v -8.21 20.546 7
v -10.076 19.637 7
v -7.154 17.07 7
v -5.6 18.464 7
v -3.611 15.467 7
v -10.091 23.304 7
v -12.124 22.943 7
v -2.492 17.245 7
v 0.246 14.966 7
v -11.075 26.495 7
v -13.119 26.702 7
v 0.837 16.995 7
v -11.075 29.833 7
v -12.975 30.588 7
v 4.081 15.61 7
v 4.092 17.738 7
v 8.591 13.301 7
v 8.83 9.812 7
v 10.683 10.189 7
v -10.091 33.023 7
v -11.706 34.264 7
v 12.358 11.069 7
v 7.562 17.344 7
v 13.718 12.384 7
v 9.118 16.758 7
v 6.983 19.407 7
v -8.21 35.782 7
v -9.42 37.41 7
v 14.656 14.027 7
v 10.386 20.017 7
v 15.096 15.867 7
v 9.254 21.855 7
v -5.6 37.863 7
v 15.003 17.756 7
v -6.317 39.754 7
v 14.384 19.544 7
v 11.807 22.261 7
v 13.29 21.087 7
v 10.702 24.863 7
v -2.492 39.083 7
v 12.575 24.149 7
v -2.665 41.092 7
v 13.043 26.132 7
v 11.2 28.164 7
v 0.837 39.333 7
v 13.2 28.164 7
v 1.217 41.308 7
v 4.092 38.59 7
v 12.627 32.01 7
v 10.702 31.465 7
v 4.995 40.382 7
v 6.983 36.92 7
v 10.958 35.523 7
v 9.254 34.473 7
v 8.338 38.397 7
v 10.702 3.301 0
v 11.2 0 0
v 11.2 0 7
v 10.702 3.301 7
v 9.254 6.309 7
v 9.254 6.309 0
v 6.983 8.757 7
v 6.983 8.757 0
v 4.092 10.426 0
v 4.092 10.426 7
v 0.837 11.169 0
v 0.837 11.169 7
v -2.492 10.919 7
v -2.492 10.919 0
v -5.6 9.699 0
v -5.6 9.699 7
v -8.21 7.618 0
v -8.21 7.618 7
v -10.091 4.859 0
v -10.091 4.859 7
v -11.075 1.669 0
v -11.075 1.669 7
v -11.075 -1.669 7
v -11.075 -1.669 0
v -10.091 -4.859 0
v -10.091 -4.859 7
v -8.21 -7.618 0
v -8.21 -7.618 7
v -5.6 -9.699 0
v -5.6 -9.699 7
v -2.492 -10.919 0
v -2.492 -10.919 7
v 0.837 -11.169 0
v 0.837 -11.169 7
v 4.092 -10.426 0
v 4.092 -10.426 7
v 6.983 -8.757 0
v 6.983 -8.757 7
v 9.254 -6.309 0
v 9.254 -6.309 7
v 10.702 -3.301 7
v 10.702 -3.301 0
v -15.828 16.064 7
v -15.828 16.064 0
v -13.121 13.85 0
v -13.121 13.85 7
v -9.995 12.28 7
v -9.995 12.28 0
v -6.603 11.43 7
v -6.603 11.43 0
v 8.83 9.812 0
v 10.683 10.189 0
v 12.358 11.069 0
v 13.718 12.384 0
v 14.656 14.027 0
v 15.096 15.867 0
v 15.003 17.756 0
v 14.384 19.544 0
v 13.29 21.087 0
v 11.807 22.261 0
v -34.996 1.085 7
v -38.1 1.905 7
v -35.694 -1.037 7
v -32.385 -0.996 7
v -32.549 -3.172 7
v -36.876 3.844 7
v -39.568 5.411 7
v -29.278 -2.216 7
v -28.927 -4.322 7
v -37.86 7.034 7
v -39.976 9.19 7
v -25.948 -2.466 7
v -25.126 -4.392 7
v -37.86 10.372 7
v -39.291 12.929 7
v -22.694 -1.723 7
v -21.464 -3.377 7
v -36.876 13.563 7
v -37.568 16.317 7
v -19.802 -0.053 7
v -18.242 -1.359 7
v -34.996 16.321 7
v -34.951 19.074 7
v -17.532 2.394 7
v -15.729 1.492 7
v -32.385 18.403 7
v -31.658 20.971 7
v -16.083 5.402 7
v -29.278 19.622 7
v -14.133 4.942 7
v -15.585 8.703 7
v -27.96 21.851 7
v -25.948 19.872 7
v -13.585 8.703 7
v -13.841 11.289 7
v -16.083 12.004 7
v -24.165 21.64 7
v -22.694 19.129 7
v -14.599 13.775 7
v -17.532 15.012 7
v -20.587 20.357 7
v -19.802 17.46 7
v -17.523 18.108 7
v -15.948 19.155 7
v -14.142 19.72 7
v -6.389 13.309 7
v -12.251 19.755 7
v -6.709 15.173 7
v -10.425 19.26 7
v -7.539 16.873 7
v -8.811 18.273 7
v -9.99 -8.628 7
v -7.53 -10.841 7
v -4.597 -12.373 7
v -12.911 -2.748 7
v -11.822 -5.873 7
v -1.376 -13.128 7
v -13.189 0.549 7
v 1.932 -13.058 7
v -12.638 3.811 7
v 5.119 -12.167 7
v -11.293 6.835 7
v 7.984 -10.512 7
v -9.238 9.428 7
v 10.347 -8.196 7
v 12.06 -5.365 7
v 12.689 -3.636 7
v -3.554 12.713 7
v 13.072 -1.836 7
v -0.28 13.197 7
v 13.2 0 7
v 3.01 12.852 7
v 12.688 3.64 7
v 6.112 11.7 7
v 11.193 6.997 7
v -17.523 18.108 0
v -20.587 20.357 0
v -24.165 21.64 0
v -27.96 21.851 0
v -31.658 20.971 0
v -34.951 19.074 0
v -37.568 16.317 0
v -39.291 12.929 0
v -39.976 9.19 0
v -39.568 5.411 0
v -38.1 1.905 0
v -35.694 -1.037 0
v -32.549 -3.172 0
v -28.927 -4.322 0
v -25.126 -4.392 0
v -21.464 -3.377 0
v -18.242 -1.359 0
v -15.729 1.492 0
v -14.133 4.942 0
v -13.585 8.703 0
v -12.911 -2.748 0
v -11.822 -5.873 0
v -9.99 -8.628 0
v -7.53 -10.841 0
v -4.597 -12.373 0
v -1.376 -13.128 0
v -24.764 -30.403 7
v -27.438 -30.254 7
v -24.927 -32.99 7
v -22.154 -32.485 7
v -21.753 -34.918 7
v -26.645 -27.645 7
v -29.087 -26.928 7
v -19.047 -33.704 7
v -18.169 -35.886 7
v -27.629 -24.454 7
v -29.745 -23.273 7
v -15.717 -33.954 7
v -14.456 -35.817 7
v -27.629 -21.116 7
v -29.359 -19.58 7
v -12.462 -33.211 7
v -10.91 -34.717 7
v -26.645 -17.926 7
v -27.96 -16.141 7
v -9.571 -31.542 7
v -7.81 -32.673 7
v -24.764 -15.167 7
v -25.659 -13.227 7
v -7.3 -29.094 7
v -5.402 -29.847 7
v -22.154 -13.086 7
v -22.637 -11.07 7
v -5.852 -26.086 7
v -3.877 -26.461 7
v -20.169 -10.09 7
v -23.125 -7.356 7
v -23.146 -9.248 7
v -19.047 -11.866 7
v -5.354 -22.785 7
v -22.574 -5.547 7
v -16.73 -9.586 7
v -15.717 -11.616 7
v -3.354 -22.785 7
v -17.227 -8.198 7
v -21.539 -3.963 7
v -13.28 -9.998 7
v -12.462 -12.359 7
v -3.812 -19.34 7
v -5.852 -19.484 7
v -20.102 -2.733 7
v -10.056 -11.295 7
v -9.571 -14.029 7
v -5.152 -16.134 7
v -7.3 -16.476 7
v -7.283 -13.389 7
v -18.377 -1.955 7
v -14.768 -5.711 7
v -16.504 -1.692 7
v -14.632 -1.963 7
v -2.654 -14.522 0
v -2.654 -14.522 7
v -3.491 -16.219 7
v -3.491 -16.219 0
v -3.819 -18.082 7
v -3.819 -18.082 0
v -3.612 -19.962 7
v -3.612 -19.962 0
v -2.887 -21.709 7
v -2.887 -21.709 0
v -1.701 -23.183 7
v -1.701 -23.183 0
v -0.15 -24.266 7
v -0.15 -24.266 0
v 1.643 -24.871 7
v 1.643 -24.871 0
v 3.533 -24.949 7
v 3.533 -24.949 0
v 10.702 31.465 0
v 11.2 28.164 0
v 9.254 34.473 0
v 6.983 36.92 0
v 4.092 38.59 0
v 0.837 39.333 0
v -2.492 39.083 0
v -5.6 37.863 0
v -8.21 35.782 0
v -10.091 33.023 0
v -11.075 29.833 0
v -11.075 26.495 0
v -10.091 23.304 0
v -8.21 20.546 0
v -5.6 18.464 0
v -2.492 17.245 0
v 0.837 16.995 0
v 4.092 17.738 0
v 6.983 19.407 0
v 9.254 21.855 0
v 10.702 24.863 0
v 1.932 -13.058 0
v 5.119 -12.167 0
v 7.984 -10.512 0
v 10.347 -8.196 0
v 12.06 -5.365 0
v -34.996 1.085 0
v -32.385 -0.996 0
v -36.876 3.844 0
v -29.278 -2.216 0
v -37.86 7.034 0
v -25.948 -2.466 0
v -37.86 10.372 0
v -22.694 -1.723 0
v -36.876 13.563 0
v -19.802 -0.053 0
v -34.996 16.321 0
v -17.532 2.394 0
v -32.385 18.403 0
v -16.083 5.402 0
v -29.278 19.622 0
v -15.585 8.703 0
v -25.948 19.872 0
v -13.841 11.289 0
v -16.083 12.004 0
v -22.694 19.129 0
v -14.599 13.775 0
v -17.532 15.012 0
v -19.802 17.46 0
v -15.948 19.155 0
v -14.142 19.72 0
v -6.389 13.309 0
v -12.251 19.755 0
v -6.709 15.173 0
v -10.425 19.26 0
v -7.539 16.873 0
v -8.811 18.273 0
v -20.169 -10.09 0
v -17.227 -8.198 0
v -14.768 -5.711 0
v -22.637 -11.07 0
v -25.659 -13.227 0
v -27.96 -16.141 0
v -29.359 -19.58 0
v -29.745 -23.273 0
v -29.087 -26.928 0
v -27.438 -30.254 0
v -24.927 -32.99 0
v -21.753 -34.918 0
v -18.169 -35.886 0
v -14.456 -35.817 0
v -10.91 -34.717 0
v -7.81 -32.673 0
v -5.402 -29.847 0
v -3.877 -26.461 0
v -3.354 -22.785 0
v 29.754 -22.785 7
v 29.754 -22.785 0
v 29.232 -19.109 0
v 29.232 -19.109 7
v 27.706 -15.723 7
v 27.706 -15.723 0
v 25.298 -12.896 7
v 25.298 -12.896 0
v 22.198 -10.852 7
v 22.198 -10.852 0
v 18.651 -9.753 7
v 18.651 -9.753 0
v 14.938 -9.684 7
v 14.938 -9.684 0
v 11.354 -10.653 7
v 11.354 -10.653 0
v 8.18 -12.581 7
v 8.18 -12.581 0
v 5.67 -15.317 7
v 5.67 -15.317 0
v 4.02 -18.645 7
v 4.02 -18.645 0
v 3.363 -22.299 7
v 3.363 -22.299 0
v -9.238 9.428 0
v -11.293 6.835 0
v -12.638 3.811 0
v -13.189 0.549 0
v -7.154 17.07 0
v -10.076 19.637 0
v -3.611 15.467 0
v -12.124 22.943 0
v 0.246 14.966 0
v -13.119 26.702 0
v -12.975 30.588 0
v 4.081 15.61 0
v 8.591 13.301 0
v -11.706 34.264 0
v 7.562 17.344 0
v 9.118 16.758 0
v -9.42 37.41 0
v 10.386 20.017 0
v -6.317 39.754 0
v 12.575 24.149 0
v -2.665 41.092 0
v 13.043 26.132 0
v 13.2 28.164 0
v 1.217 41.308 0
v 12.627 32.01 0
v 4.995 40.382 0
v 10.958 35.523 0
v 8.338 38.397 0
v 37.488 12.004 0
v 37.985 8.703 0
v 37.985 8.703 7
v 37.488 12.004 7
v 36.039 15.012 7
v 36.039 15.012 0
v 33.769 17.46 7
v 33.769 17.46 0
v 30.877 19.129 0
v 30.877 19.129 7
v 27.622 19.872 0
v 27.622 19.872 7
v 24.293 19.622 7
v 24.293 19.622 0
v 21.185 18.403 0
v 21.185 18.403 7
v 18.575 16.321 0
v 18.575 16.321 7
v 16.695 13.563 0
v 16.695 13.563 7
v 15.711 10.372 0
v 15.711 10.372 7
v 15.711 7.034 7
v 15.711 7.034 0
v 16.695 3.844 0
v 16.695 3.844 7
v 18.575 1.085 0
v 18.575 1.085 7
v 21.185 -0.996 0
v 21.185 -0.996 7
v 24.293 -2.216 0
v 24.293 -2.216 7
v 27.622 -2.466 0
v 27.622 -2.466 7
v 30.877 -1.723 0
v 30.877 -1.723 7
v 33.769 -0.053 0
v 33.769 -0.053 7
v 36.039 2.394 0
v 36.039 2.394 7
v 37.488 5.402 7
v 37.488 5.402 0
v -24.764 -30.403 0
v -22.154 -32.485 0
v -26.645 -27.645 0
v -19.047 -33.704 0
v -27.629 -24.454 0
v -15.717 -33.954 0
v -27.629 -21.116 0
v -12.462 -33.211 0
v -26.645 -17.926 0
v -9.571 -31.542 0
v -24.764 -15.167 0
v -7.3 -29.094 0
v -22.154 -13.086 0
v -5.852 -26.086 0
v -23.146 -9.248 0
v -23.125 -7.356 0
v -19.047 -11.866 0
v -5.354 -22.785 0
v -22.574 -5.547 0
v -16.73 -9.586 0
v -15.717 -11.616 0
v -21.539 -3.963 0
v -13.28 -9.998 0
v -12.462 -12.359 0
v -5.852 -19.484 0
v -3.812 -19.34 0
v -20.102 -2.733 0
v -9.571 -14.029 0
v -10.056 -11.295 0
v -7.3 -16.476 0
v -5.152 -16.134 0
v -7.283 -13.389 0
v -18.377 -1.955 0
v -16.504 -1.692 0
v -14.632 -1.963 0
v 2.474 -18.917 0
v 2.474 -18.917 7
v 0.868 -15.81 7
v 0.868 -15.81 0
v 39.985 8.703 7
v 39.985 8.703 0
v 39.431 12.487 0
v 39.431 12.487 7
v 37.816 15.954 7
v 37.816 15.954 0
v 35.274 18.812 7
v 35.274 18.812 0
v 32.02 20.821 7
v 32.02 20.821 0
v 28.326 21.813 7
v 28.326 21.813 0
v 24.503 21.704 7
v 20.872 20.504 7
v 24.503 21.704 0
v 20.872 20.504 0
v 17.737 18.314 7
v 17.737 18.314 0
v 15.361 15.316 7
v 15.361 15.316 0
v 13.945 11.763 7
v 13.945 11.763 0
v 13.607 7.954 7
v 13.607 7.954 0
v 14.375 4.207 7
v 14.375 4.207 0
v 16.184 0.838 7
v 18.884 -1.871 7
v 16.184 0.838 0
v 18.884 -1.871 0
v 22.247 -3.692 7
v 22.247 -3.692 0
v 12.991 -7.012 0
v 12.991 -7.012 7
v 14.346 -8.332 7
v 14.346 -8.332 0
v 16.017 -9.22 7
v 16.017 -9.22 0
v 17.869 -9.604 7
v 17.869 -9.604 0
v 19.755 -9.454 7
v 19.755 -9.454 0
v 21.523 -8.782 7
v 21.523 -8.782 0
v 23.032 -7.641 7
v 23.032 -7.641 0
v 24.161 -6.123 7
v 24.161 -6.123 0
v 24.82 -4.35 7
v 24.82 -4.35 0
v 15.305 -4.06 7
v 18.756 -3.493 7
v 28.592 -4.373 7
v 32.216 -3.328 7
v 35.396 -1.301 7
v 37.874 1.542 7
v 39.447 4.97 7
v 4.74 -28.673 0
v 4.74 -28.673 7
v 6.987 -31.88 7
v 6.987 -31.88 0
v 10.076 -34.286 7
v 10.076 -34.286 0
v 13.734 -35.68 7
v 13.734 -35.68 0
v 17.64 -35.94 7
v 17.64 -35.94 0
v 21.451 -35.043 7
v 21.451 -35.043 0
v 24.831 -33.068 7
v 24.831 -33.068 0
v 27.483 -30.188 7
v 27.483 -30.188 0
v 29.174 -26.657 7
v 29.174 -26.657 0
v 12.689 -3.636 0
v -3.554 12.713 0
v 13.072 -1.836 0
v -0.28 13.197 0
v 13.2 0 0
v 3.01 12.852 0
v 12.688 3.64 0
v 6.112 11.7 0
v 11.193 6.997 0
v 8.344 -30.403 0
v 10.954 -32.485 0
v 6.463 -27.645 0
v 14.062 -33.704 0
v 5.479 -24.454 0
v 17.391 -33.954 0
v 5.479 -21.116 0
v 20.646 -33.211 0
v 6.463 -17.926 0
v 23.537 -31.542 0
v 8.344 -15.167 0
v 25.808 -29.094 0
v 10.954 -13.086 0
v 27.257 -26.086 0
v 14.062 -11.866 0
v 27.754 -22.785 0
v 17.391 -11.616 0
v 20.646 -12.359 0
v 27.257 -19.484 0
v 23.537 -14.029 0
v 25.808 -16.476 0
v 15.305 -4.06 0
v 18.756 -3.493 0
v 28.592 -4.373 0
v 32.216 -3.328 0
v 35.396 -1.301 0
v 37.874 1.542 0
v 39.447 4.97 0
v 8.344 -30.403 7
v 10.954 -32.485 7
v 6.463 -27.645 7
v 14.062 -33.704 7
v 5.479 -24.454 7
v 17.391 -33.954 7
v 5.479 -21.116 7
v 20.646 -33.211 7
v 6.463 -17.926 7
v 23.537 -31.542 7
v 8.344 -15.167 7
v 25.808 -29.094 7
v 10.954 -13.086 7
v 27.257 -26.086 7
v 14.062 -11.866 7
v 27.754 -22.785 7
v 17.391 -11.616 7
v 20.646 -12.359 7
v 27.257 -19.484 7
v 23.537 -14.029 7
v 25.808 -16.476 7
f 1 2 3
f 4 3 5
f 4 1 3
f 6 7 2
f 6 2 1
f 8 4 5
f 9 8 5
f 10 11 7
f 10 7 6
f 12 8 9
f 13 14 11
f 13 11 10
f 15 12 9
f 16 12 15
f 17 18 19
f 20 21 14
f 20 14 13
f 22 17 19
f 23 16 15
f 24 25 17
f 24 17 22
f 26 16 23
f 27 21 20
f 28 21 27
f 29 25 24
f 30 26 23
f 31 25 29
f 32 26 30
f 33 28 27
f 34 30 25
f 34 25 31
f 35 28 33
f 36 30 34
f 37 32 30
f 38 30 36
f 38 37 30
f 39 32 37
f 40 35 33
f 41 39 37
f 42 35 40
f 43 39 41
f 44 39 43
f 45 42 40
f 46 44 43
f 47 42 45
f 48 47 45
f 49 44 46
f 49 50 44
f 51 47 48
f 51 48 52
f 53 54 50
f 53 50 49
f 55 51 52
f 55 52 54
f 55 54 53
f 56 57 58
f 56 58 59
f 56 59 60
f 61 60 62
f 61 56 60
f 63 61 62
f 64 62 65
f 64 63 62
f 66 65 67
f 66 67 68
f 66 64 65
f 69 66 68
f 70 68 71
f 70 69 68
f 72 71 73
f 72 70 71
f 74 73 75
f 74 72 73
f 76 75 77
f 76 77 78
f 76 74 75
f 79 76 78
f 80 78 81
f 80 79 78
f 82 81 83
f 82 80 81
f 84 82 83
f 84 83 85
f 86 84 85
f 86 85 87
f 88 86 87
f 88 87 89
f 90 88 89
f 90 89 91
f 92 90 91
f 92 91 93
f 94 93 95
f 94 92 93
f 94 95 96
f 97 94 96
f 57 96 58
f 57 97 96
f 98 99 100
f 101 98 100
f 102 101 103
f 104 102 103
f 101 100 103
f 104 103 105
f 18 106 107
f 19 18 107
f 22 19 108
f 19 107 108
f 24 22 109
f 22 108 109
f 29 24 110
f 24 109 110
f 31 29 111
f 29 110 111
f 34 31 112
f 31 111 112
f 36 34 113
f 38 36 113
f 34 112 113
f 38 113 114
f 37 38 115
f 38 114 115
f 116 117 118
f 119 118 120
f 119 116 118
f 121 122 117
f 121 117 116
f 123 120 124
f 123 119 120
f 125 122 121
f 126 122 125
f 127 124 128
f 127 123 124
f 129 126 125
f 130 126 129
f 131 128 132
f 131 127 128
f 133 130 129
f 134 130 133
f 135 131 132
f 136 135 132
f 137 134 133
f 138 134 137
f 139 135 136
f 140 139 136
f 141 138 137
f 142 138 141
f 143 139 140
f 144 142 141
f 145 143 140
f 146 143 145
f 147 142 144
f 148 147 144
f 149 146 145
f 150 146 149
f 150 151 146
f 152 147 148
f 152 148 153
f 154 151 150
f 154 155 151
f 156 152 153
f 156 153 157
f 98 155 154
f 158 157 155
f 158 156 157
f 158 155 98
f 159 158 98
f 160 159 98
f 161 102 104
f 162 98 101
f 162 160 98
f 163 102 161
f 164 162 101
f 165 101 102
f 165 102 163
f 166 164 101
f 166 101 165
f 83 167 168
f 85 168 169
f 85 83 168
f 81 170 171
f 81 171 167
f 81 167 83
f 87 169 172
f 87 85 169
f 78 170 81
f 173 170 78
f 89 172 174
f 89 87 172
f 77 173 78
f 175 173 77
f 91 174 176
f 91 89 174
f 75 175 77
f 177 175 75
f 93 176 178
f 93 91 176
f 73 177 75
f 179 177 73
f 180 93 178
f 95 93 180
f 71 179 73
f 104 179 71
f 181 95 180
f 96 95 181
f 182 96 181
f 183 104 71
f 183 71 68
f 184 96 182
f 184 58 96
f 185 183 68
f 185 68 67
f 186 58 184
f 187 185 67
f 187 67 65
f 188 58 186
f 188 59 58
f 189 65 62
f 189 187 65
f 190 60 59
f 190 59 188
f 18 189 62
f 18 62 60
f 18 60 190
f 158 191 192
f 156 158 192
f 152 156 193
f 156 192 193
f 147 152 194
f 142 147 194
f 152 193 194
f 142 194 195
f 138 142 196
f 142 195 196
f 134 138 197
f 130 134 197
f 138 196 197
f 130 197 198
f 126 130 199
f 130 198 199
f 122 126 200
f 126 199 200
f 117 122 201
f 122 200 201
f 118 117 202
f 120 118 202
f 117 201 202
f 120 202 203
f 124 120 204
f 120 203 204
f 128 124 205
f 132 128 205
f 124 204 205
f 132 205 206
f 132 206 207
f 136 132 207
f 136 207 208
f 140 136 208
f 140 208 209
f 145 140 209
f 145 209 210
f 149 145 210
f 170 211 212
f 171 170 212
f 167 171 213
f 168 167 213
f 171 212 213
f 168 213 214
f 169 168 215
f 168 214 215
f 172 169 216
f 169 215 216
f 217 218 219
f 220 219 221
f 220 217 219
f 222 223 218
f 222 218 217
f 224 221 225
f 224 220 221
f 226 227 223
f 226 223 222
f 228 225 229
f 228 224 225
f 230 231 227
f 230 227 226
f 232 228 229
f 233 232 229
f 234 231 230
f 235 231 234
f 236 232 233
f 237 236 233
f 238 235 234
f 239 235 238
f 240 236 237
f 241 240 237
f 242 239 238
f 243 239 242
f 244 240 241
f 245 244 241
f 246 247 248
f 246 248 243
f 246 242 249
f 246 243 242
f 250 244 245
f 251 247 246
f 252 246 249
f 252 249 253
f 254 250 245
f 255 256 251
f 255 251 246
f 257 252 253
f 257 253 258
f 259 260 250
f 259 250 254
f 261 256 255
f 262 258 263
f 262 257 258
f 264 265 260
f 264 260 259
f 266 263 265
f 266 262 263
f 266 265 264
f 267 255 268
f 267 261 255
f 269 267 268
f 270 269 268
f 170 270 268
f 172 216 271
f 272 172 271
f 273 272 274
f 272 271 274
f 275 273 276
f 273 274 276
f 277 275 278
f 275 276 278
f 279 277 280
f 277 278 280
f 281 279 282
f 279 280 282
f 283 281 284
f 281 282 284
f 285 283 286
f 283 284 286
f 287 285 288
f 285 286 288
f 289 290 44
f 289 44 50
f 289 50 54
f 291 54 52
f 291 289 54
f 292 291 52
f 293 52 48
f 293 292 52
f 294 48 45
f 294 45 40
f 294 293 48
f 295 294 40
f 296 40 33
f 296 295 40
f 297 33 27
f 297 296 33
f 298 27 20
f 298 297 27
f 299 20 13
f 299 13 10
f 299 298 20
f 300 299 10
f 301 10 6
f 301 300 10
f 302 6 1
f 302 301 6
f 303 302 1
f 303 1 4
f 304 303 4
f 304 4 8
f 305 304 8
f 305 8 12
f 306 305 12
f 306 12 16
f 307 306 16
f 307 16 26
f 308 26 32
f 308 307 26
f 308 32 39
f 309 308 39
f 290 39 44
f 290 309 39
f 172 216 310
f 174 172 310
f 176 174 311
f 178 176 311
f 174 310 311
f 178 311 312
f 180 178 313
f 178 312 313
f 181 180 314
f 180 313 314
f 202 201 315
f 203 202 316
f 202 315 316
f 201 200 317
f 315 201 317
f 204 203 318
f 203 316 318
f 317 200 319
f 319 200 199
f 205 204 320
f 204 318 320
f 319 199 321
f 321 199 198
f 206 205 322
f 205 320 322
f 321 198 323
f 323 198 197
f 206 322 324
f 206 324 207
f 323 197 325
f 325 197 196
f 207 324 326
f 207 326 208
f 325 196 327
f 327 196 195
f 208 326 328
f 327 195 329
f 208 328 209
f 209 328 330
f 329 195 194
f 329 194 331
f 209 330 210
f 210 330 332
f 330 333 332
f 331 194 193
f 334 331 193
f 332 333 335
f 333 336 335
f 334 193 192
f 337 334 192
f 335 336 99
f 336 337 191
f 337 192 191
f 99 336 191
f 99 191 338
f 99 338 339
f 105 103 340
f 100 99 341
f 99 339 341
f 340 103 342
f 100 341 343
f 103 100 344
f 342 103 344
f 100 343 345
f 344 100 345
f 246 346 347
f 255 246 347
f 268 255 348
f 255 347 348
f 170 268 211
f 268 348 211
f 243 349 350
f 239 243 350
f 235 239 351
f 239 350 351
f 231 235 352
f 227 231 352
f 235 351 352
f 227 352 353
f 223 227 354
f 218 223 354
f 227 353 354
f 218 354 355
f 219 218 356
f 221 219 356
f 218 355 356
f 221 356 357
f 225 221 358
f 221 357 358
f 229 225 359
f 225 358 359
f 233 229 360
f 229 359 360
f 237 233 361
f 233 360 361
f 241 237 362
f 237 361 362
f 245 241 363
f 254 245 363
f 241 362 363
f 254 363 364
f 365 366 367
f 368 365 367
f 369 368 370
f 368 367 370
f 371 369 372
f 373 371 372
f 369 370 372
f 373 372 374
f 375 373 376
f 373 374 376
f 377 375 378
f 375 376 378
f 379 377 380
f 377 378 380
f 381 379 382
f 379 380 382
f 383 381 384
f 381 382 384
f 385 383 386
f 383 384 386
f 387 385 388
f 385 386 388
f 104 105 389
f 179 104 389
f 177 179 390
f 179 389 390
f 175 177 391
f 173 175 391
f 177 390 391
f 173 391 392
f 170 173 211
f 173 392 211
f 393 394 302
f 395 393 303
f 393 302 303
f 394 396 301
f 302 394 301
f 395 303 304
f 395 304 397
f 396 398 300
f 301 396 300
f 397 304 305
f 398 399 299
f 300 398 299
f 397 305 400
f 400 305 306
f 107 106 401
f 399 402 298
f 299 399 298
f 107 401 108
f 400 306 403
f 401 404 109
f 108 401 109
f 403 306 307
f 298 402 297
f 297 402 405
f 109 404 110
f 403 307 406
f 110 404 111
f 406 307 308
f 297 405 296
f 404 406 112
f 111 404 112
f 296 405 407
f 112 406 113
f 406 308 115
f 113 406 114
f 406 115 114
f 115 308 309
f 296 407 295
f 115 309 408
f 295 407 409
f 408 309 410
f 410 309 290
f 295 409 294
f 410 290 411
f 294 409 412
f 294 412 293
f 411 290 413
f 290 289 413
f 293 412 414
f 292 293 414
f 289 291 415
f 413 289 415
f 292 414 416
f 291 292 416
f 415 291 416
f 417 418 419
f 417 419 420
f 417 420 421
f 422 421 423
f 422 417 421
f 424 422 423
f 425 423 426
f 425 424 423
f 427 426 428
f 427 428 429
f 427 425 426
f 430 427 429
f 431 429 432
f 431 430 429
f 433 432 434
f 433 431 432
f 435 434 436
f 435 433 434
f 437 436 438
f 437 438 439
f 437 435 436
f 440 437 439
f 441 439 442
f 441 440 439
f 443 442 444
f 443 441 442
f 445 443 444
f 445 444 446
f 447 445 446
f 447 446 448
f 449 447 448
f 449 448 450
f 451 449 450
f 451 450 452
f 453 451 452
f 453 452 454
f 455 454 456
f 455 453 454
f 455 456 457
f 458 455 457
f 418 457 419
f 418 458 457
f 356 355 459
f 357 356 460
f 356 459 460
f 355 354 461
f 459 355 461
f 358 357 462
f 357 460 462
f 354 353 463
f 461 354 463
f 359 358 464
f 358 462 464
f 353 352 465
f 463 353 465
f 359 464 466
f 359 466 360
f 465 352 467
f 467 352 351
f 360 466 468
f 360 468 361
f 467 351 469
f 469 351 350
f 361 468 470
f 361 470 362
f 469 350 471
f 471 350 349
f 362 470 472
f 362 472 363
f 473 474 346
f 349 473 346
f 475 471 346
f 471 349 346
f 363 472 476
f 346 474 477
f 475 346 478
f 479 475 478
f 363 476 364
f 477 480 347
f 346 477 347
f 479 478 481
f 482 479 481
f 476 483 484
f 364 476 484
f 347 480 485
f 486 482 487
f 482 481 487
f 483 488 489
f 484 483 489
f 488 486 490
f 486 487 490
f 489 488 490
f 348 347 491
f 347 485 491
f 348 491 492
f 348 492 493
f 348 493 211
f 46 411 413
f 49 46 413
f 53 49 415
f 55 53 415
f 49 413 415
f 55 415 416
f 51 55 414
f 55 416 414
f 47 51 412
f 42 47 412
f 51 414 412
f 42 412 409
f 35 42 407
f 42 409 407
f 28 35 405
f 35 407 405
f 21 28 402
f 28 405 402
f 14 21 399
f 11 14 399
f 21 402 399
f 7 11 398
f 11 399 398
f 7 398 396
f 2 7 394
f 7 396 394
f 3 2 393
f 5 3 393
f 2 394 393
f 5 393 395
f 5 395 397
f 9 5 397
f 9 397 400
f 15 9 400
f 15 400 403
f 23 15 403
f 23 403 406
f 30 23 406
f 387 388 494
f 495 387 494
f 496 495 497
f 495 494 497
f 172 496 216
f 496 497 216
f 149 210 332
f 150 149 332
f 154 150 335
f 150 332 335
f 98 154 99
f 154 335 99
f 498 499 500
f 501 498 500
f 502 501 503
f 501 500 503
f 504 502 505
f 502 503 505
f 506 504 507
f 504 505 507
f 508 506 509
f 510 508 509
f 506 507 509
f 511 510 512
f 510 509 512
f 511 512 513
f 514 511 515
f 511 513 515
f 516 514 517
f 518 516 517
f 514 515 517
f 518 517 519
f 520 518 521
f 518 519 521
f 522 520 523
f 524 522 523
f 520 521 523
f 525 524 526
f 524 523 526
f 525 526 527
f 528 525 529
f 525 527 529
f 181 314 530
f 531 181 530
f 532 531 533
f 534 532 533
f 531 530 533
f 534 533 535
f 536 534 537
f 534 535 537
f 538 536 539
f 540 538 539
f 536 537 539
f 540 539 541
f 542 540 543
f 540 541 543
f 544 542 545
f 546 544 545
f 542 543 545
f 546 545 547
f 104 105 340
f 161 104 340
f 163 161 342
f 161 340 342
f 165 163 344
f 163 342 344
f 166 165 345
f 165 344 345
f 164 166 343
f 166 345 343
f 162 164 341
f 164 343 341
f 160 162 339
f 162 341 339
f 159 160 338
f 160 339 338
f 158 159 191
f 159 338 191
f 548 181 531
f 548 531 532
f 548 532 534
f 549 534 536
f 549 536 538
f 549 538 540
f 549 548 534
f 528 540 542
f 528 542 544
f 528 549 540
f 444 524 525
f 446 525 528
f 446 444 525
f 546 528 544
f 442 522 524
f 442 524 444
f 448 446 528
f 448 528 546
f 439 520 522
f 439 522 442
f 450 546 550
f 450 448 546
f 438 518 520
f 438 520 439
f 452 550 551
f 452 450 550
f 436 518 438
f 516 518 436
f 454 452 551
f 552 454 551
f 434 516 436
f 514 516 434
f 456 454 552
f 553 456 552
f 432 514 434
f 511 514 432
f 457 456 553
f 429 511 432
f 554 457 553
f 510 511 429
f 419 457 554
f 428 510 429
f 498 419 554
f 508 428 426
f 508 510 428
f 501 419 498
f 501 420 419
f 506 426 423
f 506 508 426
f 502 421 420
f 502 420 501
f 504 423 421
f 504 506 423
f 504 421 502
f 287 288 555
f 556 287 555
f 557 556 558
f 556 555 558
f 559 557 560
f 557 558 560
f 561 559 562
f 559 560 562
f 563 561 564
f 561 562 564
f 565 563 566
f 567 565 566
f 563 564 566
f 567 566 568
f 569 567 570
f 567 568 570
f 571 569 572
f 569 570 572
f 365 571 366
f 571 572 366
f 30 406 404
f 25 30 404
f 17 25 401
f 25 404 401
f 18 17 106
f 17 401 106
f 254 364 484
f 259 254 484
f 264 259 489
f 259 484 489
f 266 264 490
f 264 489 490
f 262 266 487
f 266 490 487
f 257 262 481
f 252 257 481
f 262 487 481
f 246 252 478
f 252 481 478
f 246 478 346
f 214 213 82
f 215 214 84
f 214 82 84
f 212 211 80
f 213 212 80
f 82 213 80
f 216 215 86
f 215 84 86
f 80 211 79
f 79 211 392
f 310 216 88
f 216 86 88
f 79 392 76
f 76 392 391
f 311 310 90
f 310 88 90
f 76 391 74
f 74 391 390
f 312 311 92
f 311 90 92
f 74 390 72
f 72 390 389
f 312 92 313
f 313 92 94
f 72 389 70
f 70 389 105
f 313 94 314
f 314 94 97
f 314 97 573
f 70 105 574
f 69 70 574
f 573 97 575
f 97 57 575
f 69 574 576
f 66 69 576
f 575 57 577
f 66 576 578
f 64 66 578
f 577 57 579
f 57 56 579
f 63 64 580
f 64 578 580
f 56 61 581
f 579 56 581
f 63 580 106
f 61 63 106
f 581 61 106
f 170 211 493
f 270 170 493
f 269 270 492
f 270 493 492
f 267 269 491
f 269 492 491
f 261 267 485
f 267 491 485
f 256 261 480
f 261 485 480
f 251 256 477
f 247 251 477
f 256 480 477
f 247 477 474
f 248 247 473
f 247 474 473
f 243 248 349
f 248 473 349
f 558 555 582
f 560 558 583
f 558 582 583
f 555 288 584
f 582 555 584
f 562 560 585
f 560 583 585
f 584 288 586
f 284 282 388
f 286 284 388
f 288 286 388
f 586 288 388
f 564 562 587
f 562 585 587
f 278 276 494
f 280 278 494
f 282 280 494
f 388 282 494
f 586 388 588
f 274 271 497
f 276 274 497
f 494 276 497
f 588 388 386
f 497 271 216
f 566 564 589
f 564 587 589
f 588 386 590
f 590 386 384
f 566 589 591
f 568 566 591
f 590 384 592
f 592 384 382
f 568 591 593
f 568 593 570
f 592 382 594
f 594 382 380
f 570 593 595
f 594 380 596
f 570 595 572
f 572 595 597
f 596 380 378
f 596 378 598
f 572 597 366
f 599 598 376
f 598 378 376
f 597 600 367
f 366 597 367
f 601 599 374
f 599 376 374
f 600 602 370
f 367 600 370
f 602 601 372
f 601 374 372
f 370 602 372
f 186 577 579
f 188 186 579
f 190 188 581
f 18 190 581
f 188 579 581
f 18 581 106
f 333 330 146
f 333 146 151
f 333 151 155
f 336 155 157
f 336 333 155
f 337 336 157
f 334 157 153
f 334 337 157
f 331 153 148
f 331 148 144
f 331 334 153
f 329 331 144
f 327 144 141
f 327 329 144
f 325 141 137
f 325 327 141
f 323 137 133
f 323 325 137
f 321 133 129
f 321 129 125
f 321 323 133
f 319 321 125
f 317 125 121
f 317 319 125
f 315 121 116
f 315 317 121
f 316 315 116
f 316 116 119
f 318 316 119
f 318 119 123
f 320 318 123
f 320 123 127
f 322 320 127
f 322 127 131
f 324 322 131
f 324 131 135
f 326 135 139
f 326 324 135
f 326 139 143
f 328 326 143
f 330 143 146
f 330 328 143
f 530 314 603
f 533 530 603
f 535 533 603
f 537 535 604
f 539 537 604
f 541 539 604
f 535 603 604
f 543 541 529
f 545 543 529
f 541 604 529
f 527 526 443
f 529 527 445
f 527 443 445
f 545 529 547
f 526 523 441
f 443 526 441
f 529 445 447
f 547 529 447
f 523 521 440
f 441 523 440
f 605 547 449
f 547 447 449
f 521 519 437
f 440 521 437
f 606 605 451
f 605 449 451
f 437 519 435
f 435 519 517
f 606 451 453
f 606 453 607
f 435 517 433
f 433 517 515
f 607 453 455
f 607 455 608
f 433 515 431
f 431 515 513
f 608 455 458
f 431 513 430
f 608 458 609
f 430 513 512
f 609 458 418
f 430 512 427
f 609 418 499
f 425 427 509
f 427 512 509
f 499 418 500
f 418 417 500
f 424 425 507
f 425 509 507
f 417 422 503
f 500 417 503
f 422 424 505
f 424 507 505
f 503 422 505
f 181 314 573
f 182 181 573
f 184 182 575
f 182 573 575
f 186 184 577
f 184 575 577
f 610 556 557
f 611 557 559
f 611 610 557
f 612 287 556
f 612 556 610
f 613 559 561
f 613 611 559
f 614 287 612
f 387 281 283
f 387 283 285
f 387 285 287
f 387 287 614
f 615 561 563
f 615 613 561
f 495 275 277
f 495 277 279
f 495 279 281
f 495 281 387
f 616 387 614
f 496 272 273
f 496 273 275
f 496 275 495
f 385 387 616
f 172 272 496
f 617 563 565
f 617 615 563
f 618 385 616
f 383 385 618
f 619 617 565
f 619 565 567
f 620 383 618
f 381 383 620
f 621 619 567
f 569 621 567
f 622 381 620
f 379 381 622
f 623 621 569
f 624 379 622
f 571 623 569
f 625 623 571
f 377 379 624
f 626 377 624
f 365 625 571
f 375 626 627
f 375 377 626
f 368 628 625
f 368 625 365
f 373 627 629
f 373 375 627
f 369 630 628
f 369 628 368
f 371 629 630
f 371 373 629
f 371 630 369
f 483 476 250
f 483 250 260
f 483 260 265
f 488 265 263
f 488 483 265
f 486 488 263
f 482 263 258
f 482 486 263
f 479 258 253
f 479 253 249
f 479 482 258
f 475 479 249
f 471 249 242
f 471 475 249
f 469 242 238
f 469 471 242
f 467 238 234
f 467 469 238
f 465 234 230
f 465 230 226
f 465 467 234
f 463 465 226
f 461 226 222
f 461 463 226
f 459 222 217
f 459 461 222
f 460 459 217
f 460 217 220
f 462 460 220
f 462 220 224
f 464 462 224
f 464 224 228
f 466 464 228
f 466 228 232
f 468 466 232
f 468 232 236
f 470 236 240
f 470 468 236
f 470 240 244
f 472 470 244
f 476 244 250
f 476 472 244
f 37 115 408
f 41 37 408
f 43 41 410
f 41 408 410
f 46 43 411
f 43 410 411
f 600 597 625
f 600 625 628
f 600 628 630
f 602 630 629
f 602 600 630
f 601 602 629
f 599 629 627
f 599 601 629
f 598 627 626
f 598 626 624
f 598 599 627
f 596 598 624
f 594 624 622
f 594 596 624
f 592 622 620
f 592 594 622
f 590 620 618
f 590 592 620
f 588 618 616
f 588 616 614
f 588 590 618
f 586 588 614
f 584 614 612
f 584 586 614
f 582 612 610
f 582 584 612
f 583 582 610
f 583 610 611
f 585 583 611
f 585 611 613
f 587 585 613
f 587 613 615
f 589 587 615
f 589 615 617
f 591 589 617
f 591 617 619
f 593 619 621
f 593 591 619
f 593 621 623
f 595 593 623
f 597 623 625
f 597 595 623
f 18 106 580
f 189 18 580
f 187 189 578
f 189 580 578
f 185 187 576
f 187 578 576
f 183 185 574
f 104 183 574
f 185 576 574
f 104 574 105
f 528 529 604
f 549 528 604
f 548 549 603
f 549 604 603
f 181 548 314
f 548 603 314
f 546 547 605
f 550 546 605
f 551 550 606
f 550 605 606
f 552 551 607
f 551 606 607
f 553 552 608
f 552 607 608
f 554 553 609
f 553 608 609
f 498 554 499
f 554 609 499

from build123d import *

# Parameters (mm, degrees)
F0_R     = 11.2
F1_DEPTH = 7


with BuildPart() as f1:
    # F0 (on Top) → F1 (new body)
    with BuildSketch(Plane.XY):
        with BuildLine():
            ThreePointArc((12.0604066847, -5.3653136534), (12.9119589575, -2.7425017559), (13.2, 0))
            ThreePointArc((13.2, 0), (12.0579963137, 5.3707285258), (8.8295871367, 9.8121552676))
            ThreePointArc((8.8295871367, 9.8121552676), (1.3758458874, 13.1281014657), (-6.6034217276, 11.4295591117))
            ThreePointArc((-6.6034217276, 11.4295591117), (-12.0604066847, 5.3653136534), (-12.9107262064, -2.7482992602))
            ThreePointArc((-12.9107262064, -2.7482992602), (-8.8295871367, -9.8121552676), (-1.3758458874, -13.1281014657))
            ThreePointArc((-1.3758458874, -13.1281014657), (6.6034217276, -11.4295591117), (12.0604066847, -5.3653136534))
        make_face()
        Circle(F0_R, mode=Mode.SUBTRACT)
    extrude(amount=F1_DEPTH)


with BuildPart() as f1b:
    # F0 (on Top) → F1, piece 2 (new body)
    with BuildSketch(Plane.XY):
        with BuildLine():
            ThreePointArc((22.2472331641, -3.6922492336), (17.0146843421, -3.681623368), (12.0604066847, -5.3653136534))
            ThreePointArc((12.0604066847, -5.3653136534), (18.8173485037, -9.5959790593), (24.820005265, -4.3497514309))
            ThreePointArc((24.820005265, -4.3497514309), (23.5170433701, -4.0858607543), (22.2472331641, -3.6922492336))
        make_face()
        with BuildLine():
            ThreePointArc((22.2472331641, -3.6922492336), (23.5473295296, -3.9673525785), (24.820005265, -4.3497514309))
            ThreePointArc((24.820005265, -4.3497514309), (35.3963555487, -1.3014752572), (39.9854151304, 8.7031089476))
            ThreePointArc((39.9854151304, 8.7031089476), (19.224462874, 19.5230905085), (22.2472331641, -3.6922492336))
        make_face()
        with Locations((26.7854151304, 8.7031089476)):
            Circle(F0_R, mode=Mode.SUBTRACT)
        with BuildLine():
            ThreePointArc((22.2472331641, -3.6922492336), (23.5170433701, -4.0858607543), (24.820005265, -4.3497514309))
            ThreePointArc((24.820005265, -4.3497514309), (23.5473295296, -3.9673525785), (22.2472331641, -3.6922492336))
        make_face()
    extrude(amount=F1_DEPTH)


with BuildPart() as f1c:
    # F0 (on Top) → F1, piece 3 (new body)
    with BuildSketch(Plane.XY):
        with BuildLine():
            ThreePointArc((3.3632354321, -22.2993438309), (1.756394721, -17.3196106039), (-1.3758458874, -13.1281014657))
            ThreePointArc((-1.3758458874, -13.1281014657), (-3.3114379379, -20.8616825209), (3.5329439847, -24.9493748552))
            ThreePointArc((3.5329439847, -24.9493748552), (3.3812815638, -23.6286377509), (3.3632354321, -22.2993438309))
        make_face()
        with BuildLine():
            ThreePointArc((3.3632354321, -22.2993438309), (3.5033484746, -23.6208205599), (3.5329439847, -24.9493748552))
            ThreePointArc((3.5329439847, -24.9493748552), (17.6401470384, -35.9402974623), (29.7542969533, -22.7850350327))
            ThreePointArc((29.7542969533, -22.7850350327), (16.7971836758, -9.5872698416), (3.3632354321, -22.2993438309))
        make_face()
        with Locations((16.5542969533, -22.7850350327)):
            Circle(F0_R, mode=Mode.SUBTRACT)
        with BuildLine():
            ThreePointArc((3.3632354321, -22.2993438309), (3.3812815638, -23.6286377509), (3.5329439847, -24.9493748552))
            ThreePointArc((3.5329439847, -24.9493748552), (3.5033484746, -23.6208205599), (3.3632354321, -22.2993438309))
        make_face()
    extrude(amount=F1_DEPTH)


with BuildPart() as f1d:
    # F0 (on Top) → F1, piece 4 (new body)
    with BuildSketch(Plane.XY):
        with BuildLine():
            ThreePointArc((-20.1686393549, -10.0895031807), (-15.9291727069, -7.0224846571), (-12.9107262064, -2.7482992602))
            ThreePointArc((-12.9107262064, -2.7482992602), (-20.863929701, -3.2972498011), (-22.636525802, -11.0698102277))
            ThreePointArc((-22.636525802, -11.0698102277), (-21.4272964382, -10.5174404836), (-20.1686393549, -10.0895031807))
        make_face()
        with BuildLine():
            ThreePointArc((-20.1686393549, -10.0895031807), (-21.3821410978, -10.6311173697), (-22.636525802, -11.0698102277))
            ThreePointArc((-22.636525802, -11.0698102277), (-23.4082950274, -34.0661125699), (-3.3542969533, -22.7850350327))
            ThreePointArc((-3.3542969533, -22.7850350327), (-8.6003457246, -12.2505839388), (-20.1686393549, -10.0895031807))
        make_face()
        with Locations((-16.5542969533, -22.7850350327)):
            Circle(F0_R, mode=Mode.SUBTRACT)
        with BuildLine():
            ThreePointArc((-20.1686393549, -10.0895031807), (-21.4272964382, -10.5174404836), (-22.636525802, -11.0698102277))
            ThreePointArc((-22.636525802, -11.0698102277), (-21.3821410978, -10.6311173697), (-20.1686393549, -10.0895031807))
        make_face()
    extrude(amount=F1_DEPTH)


with BuildPart() as f1e:
    # F0 (on Top) → F1, piece 5 (new body)
    with BuildSketch(Plane.XY):
        with BuildLine():
            ThreePointArc((-15.8281400603, 16.0636879357), (-11.6011648665, 12.9794764003), (-6.6034217276, 11.4295591117))
            ThreePointArc((-6.6034217276, 11.4295591117), (-9.5831797562, 18.8238700744), (-17.5230863176, 18.1078558855))
            ThreePointArc((-17.5230863176, 18.1078558855), (-16.6240790496, 17.1285020574), (-15.8281400603, 16.0636879357))
        make_face()
        with BuildLine():
            ThreePointArc((-15.8281400603, 16.0636879357), (-16.7182384253, 17.050428687), (-17.5230863176, 18.1078558855))
            ThreePointArc((-17.5230863176, 18.1078558855), (-38.961267058, 3.6052044923), (-13.5854151304, 8.7031089476))
            ThreePointArc((-13.5854151304, 8.7031089476), (-14.1585384198, 12.5504436793), (-15.8281400603, 16.0636879357))
        make_face()
        with Locations((-26.7854151304, 8.7031089476)):
            Circle(F0_R, mode=Mode.SUBTRACT)
        with BuildLine():
            ThreePointArc((-15.8281400603, 16.0636879357), (-16.6240790496, 17.1285020574), (-17.5230863176, 18.1078558855))
            ThreePointArc((-17.5230863176, 18.1078558855), (-16.7182384253, 17.050428687), (-15.8281400603, 16.0636879357))
        make_face()
    extrude(amount=F1_DEPTH)


with BuildPart() as f1f:
    # F0 (on Top) → F1, piece 6 (new body)
    with BuildSketch(Plane.XY):
        with BuildLine():
            ThreePointArc((10.386310819, 20.0174083096), (8.7592585103, 15.0442422287), (8.8295871367, 9.8121552676))
            ThreePointArc((8.8295871367, 9.8121552676), (14.9411988913, 14.9310413069), (11.80666287, 22.2610806283))
            ThreePointArc((11.80666287, 22.2610806283), (11.1530505539, 21.1034369314), (10.386310819, 20.0174083096))
        make_face()
        with BuildLine():
            ThreePointArc((10.386310819, 20.0174083096), (11.049701519, 21.168861821), (11.80666287, 22.2610806283))
            ThreePointArc((11.80666287, 22.2610806283), (12.8469441869, 25.131357313), (13.2, 28.1638521701))
            ThreePointArc((13.2, 28.1638521701), (-12.4767644606, 32.4731849021), (10.386310819, 20.0174083096))
        make_face()
        with Locations((0, 28.1638521701)):
            Circle(F0_R, mode=Mode.SUBTRACT)
        with BuildLine():
            ThreePointArc((10.386310819, 20.0174083096), (11.1530505539, 21.1034369314), (11.80666287, 22.2610806283))
            ThreePointArc((11.80666287, 22.2610806283), (11.049701519, 21.168861821), (10.386310819, 20.0174083096))
        make_face()
    extrude(amount=F1_DEPTH)


solid = Compound([f1.part, f1b.part, f1c.part, f1d.part, f1e.part, f1f.part])
